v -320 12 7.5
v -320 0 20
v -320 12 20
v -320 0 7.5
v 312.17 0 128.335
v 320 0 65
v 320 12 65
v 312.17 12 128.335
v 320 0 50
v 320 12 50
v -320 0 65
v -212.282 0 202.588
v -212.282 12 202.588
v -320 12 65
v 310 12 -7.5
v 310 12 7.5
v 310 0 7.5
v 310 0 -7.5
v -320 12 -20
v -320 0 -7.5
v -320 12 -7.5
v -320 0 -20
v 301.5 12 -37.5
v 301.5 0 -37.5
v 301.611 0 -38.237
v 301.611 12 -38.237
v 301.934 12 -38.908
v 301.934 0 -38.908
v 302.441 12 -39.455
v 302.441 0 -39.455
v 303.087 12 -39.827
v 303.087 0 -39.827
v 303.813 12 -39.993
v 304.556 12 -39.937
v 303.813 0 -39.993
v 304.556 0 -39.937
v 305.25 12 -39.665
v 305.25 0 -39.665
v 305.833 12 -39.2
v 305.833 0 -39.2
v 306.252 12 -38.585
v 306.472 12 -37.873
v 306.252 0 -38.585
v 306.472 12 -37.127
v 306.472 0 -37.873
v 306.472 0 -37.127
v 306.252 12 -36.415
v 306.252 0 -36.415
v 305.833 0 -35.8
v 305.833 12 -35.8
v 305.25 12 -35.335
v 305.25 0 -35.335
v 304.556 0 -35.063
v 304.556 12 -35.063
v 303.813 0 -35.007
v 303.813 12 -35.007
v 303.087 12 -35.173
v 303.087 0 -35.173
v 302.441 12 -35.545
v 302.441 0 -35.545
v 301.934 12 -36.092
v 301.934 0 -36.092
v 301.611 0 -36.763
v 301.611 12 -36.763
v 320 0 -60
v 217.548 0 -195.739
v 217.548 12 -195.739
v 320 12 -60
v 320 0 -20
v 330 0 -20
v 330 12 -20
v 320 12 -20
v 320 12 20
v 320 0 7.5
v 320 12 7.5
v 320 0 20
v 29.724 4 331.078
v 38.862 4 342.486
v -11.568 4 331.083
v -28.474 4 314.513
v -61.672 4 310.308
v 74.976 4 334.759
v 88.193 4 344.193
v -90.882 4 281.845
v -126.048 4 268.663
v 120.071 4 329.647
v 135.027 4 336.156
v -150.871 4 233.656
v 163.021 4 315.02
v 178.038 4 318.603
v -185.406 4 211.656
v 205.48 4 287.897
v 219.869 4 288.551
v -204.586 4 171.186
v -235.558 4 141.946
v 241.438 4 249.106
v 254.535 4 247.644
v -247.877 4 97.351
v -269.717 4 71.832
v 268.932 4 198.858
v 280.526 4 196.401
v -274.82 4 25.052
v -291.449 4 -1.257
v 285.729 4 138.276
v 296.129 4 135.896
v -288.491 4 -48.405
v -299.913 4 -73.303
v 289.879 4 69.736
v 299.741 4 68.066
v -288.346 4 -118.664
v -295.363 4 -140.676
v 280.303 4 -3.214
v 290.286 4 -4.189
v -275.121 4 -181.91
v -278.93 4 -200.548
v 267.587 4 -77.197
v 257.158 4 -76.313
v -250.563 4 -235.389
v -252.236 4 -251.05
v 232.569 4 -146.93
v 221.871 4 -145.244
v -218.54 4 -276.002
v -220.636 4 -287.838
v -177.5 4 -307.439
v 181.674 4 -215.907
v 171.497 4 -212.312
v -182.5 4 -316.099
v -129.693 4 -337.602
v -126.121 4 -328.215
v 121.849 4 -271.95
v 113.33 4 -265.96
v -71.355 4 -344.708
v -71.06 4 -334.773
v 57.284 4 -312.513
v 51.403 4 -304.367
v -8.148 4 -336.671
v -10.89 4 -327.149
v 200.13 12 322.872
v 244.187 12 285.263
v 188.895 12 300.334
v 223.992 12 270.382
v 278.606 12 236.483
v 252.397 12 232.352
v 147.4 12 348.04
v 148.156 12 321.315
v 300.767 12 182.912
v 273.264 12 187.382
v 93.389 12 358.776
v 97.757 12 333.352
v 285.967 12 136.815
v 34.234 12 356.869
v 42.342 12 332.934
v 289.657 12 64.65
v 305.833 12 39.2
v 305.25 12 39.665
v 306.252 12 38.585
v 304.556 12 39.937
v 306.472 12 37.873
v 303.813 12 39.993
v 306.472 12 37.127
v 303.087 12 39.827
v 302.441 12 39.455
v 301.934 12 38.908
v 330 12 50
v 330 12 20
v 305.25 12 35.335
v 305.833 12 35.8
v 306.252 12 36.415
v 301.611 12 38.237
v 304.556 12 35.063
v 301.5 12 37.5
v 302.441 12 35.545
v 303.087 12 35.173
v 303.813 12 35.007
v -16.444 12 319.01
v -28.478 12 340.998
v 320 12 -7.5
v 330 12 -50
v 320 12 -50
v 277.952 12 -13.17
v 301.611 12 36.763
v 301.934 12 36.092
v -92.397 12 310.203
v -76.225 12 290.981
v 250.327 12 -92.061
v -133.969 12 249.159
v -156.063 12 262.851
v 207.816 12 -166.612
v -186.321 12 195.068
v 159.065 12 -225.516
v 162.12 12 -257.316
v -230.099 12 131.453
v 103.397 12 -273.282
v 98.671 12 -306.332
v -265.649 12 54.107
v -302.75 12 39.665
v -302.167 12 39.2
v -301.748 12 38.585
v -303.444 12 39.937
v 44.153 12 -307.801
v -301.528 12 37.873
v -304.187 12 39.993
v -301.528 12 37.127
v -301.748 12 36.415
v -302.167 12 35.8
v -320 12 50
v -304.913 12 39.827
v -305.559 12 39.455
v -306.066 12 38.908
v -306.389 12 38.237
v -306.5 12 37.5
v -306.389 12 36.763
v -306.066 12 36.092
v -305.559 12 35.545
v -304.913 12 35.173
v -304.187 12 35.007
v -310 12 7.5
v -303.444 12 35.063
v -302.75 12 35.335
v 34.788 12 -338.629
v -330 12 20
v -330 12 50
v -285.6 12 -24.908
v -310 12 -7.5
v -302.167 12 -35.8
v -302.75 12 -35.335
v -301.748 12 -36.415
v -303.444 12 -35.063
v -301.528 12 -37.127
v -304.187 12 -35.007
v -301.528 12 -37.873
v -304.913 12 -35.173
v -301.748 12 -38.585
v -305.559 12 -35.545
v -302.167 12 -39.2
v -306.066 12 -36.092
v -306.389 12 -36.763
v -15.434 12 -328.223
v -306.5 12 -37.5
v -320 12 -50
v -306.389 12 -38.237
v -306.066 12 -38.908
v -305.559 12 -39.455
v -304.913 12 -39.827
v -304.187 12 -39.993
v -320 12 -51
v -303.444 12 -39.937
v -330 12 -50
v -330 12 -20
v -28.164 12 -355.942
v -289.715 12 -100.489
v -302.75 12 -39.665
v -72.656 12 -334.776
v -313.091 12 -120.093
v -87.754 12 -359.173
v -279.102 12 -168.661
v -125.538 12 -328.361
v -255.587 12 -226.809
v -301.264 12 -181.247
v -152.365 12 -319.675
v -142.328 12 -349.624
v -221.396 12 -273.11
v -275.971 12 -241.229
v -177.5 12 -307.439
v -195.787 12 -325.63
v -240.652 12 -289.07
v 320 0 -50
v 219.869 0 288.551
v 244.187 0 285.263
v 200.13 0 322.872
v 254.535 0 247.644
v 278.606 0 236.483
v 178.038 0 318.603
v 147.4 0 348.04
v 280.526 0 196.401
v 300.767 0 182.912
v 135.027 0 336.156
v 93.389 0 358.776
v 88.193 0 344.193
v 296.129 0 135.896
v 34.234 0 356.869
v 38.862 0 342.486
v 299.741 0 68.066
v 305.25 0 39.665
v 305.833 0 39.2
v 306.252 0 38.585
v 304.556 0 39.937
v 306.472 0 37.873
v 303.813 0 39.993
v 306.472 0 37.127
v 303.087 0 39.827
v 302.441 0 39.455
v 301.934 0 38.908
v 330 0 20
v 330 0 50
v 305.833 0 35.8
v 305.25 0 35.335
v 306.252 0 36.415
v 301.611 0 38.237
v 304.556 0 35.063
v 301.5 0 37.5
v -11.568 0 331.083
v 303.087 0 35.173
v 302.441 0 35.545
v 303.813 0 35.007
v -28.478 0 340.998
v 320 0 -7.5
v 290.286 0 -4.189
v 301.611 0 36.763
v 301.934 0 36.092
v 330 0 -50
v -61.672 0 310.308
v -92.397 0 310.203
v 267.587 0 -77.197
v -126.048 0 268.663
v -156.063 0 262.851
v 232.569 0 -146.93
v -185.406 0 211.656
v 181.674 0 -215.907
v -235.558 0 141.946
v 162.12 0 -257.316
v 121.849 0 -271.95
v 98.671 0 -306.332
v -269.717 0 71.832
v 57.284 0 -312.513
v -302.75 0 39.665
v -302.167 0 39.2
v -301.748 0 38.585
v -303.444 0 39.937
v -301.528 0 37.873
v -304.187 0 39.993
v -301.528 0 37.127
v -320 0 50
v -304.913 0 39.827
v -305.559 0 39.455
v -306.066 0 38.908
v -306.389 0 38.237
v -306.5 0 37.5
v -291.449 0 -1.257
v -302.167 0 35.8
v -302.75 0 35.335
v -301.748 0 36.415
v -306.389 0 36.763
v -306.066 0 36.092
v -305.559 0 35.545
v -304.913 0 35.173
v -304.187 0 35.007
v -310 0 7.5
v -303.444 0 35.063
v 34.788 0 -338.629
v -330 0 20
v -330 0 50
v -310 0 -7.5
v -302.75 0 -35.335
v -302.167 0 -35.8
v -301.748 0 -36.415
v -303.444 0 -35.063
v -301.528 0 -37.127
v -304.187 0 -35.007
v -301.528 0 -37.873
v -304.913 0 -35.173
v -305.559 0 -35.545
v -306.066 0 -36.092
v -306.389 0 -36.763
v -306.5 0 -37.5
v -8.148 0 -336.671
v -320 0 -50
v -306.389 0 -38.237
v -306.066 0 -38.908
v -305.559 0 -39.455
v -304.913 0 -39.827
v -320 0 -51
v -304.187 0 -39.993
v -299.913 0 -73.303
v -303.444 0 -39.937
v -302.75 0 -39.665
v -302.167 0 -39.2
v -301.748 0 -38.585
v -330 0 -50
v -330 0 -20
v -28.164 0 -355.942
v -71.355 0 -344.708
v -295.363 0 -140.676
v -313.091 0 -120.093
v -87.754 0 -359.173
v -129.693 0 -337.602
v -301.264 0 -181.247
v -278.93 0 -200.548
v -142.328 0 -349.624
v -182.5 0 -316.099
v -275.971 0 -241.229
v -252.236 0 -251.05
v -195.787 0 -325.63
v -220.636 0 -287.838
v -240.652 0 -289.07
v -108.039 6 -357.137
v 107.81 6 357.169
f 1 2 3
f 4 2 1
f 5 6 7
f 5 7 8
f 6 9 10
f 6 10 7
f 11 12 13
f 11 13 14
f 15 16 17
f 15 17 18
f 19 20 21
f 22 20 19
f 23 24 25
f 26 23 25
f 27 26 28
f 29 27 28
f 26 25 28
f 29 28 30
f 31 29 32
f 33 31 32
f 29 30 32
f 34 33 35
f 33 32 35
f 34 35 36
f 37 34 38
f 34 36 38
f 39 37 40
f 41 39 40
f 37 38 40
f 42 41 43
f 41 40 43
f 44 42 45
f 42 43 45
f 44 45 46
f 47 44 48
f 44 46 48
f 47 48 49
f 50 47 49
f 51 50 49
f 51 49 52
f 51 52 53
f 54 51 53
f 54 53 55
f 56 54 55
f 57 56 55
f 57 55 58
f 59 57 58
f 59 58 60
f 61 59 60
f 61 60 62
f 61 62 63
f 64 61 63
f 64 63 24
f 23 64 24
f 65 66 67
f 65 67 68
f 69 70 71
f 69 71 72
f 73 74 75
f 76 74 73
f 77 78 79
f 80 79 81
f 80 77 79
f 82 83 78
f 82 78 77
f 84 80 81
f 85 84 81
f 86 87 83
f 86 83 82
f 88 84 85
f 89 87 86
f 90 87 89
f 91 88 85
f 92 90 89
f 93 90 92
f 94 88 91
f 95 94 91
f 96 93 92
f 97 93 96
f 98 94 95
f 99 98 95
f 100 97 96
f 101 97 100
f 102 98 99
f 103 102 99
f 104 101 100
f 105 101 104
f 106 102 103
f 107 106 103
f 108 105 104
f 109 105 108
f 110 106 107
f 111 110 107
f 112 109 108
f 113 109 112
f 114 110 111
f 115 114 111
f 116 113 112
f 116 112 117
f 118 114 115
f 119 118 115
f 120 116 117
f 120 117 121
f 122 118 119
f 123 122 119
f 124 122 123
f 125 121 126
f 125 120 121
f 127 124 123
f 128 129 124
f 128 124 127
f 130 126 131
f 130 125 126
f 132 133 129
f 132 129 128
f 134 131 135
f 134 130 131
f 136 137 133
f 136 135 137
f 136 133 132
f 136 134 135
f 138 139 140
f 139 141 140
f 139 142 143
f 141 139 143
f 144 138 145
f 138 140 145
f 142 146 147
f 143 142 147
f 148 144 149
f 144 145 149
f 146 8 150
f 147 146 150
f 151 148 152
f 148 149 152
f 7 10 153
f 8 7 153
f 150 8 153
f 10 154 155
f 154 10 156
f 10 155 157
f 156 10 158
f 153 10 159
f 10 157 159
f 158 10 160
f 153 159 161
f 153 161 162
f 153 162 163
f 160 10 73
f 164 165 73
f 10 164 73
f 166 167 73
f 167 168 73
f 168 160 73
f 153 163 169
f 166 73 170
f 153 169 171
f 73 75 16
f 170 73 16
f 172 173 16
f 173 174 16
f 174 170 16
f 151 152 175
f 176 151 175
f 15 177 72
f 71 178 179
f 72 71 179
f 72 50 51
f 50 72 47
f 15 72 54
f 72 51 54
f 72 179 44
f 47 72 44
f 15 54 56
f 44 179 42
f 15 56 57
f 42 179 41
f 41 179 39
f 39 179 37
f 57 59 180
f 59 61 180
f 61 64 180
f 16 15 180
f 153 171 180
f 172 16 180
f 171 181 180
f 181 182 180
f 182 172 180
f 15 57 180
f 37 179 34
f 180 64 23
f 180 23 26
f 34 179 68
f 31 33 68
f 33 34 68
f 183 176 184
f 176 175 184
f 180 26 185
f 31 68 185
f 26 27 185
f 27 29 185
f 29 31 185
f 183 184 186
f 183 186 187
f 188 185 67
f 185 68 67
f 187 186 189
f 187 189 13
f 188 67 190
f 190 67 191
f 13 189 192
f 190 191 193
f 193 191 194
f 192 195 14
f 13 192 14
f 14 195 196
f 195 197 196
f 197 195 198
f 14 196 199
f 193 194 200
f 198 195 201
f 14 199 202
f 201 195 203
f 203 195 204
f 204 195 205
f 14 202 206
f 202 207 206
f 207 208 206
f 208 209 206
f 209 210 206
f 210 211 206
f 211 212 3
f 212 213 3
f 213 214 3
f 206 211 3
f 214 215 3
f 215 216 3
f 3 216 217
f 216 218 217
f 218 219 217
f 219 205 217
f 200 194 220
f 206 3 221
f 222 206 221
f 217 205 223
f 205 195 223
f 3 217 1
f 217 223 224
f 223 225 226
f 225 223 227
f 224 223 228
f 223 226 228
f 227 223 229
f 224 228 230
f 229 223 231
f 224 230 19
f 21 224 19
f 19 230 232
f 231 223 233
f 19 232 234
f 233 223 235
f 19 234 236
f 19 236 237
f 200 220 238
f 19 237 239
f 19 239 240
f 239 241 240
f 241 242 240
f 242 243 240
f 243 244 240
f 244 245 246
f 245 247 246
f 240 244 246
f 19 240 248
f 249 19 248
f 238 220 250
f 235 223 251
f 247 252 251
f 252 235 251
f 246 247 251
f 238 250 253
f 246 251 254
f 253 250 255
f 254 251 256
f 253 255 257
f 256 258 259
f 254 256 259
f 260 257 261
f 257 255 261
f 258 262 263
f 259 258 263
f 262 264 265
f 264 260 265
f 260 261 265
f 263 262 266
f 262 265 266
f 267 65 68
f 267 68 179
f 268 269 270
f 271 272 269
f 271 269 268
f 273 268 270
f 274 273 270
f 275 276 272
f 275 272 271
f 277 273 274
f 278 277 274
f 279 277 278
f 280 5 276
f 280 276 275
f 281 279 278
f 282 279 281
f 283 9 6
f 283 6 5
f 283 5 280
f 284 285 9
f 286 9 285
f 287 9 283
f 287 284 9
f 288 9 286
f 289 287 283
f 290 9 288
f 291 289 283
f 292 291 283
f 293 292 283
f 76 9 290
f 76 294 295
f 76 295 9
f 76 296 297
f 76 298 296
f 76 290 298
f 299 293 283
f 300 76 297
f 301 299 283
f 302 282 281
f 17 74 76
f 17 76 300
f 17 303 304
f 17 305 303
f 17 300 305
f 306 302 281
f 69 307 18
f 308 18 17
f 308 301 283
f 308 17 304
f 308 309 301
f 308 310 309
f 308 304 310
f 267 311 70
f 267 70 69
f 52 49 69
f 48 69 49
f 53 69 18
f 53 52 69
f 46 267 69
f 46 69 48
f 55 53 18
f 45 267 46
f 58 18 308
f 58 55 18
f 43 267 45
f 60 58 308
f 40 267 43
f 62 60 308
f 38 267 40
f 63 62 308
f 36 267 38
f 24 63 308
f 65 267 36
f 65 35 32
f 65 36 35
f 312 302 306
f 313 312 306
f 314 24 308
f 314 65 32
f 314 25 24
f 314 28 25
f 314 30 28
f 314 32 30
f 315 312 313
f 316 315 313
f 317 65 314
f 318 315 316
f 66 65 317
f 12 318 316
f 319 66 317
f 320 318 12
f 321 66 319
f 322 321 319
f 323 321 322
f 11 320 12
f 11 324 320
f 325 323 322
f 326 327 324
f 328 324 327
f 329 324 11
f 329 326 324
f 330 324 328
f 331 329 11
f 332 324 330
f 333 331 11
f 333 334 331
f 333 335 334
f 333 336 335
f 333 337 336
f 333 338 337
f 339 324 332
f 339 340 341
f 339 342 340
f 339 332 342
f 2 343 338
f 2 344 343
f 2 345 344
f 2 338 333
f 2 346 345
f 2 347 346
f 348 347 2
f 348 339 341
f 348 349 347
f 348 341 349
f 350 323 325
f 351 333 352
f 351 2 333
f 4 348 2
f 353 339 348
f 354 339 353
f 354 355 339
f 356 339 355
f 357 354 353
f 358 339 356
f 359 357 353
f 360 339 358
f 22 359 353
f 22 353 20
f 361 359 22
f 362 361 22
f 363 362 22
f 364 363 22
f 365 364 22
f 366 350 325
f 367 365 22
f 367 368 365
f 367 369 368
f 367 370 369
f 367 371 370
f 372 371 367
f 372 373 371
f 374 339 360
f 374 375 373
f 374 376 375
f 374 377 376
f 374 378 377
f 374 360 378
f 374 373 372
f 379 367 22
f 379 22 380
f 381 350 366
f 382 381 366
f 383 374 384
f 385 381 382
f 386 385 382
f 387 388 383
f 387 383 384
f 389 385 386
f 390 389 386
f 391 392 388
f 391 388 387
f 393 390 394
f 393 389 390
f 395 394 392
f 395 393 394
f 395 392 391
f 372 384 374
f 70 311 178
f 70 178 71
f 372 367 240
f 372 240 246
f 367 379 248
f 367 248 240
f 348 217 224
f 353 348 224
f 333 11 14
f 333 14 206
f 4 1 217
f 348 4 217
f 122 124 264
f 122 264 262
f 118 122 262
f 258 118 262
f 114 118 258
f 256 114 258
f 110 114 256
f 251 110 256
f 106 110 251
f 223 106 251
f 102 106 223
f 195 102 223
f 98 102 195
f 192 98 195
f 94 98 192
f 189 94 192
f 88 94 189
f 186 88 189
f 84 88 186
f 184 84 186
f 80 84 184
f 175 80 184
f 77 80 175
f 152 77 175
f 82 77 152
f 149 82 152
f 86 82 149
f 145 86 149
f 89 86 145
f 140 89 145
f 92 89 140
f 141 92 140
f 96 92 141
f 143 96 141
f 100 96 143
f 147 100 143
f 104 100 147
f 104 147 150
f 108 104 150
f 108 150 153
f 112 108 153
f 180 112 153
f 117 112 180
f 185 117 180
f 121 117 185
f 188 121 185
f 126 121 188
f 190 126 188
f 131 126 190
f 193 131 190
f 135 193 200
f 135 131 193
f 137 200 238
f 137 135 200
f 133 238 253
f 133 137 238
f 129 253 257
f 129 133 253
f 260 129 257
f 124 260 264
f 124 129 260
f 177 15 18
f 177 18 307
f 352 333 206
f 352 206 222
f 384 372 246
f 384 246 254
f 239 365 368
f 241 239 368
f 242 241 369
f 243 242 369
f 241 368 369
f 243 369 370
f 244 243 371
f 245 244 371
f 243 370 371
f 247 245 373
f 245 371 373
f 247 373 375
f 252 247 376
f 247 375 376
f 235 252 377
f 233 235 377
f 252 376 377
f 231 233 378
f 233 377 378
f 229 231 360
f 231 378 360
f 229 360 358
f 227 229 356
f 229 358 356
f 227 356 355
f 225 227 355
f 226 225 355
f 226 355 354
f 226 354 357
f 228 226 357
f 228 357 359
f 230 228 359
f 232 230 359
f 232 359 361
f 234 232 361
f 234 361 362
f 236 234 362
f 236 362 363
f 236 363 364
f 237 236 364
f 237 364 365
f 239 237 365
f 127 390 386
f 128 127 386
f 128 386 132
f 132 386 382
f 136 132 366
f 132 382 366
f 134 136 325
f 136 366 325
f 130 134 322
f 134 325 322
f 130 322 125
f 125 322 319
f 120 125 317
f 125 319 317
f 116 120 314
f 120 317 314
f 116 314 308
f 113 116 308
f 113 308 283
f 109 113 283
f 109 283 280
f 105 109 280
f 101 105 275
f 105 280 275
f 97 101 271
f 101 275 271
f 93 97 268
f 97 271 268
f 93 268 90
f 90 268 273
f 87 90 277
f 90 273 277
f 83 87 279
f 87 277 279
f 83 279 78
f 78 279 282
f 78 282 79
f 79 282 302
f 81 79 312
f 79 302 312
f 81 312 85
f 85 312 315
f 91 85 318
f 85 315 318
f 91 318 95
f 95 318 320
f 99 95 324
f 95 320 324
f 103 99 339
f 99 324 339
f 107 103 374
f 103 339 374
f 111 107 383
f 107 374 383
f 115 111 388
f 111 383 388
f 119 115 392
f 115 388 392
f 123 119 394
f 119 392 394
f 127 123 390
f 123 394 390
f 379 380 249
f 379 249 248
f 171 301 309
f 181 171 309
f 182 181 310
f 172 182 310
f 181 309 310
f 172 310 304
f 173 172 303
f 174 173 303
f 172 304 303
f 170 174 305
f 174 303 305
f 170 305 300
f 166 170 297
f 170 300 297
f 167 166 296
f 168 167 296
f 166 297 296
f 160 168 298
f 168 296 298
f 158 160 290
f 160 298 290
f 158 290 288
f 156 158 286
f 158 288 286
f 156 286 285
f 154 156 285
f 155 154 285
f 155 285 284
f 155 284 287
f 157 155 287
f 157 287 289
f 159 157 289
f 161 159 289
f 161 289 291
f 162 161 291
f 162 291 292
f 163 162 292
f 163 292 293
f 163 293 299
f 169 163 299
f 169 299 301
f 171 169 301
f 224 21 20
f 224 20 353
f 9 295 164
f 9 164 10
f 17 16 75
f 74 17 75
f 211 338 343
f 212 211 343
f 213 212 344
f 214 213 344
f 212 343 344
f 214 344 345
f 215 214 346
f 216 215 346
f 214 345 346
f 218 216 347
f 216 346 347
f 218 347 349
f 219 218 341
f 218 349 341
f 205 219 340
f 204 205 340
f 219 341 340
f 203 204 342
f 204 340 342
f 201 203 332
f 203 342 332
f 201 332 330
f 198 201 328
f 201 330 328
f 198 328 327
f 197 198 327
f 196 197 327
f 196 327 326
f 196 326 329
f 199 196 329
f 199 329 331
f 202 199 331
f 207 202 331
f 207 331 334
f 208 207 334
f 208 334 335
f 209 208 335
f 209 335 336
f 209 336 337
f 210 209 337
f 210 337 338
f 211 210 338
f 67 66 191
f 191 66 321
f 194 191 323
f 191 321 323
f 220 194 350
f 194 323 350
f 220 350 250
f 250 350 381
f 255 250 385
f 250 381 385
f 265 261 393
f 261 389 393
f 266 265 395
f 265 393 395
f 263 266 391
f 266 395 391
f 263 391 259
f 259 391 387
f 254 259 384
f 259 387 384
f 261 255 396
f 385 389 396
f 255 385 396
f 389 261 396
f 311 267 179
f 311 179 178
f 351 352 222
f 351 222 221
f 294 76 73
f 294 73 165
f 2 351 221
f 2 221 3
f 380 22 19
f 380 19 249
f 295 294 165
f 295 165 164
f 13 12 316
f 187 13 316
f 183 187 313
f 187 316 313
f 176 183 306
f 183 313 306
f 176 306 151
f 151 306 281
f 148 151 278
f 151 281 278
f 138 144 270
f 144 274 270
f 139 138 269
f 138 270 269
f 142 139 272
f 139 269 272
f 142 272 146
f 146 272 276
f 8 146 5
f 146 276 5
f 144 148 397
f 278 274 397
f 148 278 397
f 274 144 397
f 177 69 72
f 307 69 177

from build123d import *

# Parameters (mm, degrees)
SKETCH1_RX                   = 355
SKETCH1_RY                   = 265
BOSS_EXTRUDE1_DEPTH          = 12
SKETCH2_W                    = 10
SKETCH2_H                    = 15
CUT_EXTRUDE1_DEPTH           = 12
F_5_0_5_DIAMETER_HOLE2_D     = 5
F_5_0_5_DIAMETER_HOLE2_DEPTH = 25
F_5_0_5_DIAMETER_HOLE2_TIP   = 1.502151548
SKETCH9_RX                   = 365
SKETCH9_RY                   = 275
CUT_EXTRUDE4_DEPTH           = 4


with BuildPart() as part:
    # Sketch1 → Boss-Extrude1 (new body)
    with BuildSketch(Plane(origin=(0, 0, 0), x_dir=(1, 0, 0), z_dir=(0, 1, 0))):
        with BuildLine():
            Line((-320, 50), (-320, 51))
            Line((-320, 51), (-313.091302172, 120.09271769))
            add(Edge.make_bspline(
                [(217.547896668, 195.738545202), (-244.337364097, 807.689215884), (-313.091302172, 120.09271769)],
                knots=[4.872921291, 4.872921291, 4.872921291, 7.098478155, 7.098478155, 7.098478155], degree=2, weights=[1, 0.442171166, 1]))
            Line((217.547896668, 195.738545202), (320, 60))
            Line((320, 60), (320, 50))
            Line((320, 50), (330, 50))
            Line((330, 50), (330, 20))
            Line((330, 20), (320, 20))
            Line((320, 20), (320, 0))
            Line((320, 0), (320, -20))
            Line((320, -20), (330, -20))
            Line((330, -20), (330, -50))
            Line((330, -50), (320, -50))
            Line((320, -50), (320, -65))
            Line((320, -65), (312.170159719, -128.33520269))
            add(Edge.make_bspline(
                [(-212.28214963, -202.588475219), (232.721291269, -770.993291043), (312.170159719, -128.33520269)],
                knots=[1.754206291, 1.754206291, 1.754206291, 3.932461359, 3.932461359, 3.932461359], degree=2, weights=[1, 0.463258742, 1]))
            Line((-212.28214963, -202.588475219), (-320, -65))
            Line((-320, -65), (-320, -50))
            Line((-320, -50), (-330, -50))
            Line((-330, -50), (-330, -20))
            Line((-330, -20), (-320, -20))
            Line((-320, -20), (-320, 0))
            Line((-320, 0), (-320, 20))
            Line((-320, 20), (-330, 20))
            Line((-330, 20), (-330, 50))
            Line((-330, 50), (-320, 50))
        make_face()
        with Locations(Location((0, 0), (0, 0, 120))):
            Ellipse(SKETCH1_RX, SKETCH1_RY, mode=Mode.SUBTRACT)
    extrude(amount=BOSS_EXTRUDE1_DEPTH)

    # Sketch2 → Cut-Extrude1 (cut)
    with BuildSketch(Plane(origin=(0, 12, 0), x_dir=(1, 0, 0), z_dir=(0, 1, 0))):
        with Locations((315, 0)):
            Rectangle(SKETCH2_W, SKETCH2_H)
        with Locations((-315, 0)):
            Rectangle(SKETCH2_W, SKETCH2_H)
    extrude(amount=-CUT_EXTRUDE1_DEPTH, mode=Mode.SUBTRACT)

    # Ø5.0 (5) Diameter Hole2
    with Locations(Plane(origin=(0, 12, 0), x_dir=(1, 0, 0), z_dir=(0, 1, 0))):
        with Locations((304, 37.5), (304, -37.5), (-304, -37.5), (-304, 37.5)):
            Hole(F_5_0_5_DIAMETER_HOLE2_D / 2, depth=F_5_0_5_DIAMETER_HOLE2_DEPTH)
            with Locations((0, 0, -(F_5_0_5_DIAMETER_HOLE2_DEPTH + F_5_0_5_DIAMETER_HOLE2_TIP / 2))):  # 118° drill point
                Cone(0, F_5_0_5_DIAMETER_HOLE2_D / 2, F_5_0_5_DIAMETER_HOLE2_TIP, mode=Mode.SUBTRACT)

    # Sketch9 → Cut-Extrude4 (cut)
    with BuildSketch(Plane.XZ):
        with Locations(Location((0, 0), (0, 0, -119.999999993))):
            Ellipse(SKETCH9_RX, SKETCH9_RY)
    extrude(amount=-CUT_EXTRUDE4_DEPTH, mode=Mode.SUBTRACT)


solid = part.part
